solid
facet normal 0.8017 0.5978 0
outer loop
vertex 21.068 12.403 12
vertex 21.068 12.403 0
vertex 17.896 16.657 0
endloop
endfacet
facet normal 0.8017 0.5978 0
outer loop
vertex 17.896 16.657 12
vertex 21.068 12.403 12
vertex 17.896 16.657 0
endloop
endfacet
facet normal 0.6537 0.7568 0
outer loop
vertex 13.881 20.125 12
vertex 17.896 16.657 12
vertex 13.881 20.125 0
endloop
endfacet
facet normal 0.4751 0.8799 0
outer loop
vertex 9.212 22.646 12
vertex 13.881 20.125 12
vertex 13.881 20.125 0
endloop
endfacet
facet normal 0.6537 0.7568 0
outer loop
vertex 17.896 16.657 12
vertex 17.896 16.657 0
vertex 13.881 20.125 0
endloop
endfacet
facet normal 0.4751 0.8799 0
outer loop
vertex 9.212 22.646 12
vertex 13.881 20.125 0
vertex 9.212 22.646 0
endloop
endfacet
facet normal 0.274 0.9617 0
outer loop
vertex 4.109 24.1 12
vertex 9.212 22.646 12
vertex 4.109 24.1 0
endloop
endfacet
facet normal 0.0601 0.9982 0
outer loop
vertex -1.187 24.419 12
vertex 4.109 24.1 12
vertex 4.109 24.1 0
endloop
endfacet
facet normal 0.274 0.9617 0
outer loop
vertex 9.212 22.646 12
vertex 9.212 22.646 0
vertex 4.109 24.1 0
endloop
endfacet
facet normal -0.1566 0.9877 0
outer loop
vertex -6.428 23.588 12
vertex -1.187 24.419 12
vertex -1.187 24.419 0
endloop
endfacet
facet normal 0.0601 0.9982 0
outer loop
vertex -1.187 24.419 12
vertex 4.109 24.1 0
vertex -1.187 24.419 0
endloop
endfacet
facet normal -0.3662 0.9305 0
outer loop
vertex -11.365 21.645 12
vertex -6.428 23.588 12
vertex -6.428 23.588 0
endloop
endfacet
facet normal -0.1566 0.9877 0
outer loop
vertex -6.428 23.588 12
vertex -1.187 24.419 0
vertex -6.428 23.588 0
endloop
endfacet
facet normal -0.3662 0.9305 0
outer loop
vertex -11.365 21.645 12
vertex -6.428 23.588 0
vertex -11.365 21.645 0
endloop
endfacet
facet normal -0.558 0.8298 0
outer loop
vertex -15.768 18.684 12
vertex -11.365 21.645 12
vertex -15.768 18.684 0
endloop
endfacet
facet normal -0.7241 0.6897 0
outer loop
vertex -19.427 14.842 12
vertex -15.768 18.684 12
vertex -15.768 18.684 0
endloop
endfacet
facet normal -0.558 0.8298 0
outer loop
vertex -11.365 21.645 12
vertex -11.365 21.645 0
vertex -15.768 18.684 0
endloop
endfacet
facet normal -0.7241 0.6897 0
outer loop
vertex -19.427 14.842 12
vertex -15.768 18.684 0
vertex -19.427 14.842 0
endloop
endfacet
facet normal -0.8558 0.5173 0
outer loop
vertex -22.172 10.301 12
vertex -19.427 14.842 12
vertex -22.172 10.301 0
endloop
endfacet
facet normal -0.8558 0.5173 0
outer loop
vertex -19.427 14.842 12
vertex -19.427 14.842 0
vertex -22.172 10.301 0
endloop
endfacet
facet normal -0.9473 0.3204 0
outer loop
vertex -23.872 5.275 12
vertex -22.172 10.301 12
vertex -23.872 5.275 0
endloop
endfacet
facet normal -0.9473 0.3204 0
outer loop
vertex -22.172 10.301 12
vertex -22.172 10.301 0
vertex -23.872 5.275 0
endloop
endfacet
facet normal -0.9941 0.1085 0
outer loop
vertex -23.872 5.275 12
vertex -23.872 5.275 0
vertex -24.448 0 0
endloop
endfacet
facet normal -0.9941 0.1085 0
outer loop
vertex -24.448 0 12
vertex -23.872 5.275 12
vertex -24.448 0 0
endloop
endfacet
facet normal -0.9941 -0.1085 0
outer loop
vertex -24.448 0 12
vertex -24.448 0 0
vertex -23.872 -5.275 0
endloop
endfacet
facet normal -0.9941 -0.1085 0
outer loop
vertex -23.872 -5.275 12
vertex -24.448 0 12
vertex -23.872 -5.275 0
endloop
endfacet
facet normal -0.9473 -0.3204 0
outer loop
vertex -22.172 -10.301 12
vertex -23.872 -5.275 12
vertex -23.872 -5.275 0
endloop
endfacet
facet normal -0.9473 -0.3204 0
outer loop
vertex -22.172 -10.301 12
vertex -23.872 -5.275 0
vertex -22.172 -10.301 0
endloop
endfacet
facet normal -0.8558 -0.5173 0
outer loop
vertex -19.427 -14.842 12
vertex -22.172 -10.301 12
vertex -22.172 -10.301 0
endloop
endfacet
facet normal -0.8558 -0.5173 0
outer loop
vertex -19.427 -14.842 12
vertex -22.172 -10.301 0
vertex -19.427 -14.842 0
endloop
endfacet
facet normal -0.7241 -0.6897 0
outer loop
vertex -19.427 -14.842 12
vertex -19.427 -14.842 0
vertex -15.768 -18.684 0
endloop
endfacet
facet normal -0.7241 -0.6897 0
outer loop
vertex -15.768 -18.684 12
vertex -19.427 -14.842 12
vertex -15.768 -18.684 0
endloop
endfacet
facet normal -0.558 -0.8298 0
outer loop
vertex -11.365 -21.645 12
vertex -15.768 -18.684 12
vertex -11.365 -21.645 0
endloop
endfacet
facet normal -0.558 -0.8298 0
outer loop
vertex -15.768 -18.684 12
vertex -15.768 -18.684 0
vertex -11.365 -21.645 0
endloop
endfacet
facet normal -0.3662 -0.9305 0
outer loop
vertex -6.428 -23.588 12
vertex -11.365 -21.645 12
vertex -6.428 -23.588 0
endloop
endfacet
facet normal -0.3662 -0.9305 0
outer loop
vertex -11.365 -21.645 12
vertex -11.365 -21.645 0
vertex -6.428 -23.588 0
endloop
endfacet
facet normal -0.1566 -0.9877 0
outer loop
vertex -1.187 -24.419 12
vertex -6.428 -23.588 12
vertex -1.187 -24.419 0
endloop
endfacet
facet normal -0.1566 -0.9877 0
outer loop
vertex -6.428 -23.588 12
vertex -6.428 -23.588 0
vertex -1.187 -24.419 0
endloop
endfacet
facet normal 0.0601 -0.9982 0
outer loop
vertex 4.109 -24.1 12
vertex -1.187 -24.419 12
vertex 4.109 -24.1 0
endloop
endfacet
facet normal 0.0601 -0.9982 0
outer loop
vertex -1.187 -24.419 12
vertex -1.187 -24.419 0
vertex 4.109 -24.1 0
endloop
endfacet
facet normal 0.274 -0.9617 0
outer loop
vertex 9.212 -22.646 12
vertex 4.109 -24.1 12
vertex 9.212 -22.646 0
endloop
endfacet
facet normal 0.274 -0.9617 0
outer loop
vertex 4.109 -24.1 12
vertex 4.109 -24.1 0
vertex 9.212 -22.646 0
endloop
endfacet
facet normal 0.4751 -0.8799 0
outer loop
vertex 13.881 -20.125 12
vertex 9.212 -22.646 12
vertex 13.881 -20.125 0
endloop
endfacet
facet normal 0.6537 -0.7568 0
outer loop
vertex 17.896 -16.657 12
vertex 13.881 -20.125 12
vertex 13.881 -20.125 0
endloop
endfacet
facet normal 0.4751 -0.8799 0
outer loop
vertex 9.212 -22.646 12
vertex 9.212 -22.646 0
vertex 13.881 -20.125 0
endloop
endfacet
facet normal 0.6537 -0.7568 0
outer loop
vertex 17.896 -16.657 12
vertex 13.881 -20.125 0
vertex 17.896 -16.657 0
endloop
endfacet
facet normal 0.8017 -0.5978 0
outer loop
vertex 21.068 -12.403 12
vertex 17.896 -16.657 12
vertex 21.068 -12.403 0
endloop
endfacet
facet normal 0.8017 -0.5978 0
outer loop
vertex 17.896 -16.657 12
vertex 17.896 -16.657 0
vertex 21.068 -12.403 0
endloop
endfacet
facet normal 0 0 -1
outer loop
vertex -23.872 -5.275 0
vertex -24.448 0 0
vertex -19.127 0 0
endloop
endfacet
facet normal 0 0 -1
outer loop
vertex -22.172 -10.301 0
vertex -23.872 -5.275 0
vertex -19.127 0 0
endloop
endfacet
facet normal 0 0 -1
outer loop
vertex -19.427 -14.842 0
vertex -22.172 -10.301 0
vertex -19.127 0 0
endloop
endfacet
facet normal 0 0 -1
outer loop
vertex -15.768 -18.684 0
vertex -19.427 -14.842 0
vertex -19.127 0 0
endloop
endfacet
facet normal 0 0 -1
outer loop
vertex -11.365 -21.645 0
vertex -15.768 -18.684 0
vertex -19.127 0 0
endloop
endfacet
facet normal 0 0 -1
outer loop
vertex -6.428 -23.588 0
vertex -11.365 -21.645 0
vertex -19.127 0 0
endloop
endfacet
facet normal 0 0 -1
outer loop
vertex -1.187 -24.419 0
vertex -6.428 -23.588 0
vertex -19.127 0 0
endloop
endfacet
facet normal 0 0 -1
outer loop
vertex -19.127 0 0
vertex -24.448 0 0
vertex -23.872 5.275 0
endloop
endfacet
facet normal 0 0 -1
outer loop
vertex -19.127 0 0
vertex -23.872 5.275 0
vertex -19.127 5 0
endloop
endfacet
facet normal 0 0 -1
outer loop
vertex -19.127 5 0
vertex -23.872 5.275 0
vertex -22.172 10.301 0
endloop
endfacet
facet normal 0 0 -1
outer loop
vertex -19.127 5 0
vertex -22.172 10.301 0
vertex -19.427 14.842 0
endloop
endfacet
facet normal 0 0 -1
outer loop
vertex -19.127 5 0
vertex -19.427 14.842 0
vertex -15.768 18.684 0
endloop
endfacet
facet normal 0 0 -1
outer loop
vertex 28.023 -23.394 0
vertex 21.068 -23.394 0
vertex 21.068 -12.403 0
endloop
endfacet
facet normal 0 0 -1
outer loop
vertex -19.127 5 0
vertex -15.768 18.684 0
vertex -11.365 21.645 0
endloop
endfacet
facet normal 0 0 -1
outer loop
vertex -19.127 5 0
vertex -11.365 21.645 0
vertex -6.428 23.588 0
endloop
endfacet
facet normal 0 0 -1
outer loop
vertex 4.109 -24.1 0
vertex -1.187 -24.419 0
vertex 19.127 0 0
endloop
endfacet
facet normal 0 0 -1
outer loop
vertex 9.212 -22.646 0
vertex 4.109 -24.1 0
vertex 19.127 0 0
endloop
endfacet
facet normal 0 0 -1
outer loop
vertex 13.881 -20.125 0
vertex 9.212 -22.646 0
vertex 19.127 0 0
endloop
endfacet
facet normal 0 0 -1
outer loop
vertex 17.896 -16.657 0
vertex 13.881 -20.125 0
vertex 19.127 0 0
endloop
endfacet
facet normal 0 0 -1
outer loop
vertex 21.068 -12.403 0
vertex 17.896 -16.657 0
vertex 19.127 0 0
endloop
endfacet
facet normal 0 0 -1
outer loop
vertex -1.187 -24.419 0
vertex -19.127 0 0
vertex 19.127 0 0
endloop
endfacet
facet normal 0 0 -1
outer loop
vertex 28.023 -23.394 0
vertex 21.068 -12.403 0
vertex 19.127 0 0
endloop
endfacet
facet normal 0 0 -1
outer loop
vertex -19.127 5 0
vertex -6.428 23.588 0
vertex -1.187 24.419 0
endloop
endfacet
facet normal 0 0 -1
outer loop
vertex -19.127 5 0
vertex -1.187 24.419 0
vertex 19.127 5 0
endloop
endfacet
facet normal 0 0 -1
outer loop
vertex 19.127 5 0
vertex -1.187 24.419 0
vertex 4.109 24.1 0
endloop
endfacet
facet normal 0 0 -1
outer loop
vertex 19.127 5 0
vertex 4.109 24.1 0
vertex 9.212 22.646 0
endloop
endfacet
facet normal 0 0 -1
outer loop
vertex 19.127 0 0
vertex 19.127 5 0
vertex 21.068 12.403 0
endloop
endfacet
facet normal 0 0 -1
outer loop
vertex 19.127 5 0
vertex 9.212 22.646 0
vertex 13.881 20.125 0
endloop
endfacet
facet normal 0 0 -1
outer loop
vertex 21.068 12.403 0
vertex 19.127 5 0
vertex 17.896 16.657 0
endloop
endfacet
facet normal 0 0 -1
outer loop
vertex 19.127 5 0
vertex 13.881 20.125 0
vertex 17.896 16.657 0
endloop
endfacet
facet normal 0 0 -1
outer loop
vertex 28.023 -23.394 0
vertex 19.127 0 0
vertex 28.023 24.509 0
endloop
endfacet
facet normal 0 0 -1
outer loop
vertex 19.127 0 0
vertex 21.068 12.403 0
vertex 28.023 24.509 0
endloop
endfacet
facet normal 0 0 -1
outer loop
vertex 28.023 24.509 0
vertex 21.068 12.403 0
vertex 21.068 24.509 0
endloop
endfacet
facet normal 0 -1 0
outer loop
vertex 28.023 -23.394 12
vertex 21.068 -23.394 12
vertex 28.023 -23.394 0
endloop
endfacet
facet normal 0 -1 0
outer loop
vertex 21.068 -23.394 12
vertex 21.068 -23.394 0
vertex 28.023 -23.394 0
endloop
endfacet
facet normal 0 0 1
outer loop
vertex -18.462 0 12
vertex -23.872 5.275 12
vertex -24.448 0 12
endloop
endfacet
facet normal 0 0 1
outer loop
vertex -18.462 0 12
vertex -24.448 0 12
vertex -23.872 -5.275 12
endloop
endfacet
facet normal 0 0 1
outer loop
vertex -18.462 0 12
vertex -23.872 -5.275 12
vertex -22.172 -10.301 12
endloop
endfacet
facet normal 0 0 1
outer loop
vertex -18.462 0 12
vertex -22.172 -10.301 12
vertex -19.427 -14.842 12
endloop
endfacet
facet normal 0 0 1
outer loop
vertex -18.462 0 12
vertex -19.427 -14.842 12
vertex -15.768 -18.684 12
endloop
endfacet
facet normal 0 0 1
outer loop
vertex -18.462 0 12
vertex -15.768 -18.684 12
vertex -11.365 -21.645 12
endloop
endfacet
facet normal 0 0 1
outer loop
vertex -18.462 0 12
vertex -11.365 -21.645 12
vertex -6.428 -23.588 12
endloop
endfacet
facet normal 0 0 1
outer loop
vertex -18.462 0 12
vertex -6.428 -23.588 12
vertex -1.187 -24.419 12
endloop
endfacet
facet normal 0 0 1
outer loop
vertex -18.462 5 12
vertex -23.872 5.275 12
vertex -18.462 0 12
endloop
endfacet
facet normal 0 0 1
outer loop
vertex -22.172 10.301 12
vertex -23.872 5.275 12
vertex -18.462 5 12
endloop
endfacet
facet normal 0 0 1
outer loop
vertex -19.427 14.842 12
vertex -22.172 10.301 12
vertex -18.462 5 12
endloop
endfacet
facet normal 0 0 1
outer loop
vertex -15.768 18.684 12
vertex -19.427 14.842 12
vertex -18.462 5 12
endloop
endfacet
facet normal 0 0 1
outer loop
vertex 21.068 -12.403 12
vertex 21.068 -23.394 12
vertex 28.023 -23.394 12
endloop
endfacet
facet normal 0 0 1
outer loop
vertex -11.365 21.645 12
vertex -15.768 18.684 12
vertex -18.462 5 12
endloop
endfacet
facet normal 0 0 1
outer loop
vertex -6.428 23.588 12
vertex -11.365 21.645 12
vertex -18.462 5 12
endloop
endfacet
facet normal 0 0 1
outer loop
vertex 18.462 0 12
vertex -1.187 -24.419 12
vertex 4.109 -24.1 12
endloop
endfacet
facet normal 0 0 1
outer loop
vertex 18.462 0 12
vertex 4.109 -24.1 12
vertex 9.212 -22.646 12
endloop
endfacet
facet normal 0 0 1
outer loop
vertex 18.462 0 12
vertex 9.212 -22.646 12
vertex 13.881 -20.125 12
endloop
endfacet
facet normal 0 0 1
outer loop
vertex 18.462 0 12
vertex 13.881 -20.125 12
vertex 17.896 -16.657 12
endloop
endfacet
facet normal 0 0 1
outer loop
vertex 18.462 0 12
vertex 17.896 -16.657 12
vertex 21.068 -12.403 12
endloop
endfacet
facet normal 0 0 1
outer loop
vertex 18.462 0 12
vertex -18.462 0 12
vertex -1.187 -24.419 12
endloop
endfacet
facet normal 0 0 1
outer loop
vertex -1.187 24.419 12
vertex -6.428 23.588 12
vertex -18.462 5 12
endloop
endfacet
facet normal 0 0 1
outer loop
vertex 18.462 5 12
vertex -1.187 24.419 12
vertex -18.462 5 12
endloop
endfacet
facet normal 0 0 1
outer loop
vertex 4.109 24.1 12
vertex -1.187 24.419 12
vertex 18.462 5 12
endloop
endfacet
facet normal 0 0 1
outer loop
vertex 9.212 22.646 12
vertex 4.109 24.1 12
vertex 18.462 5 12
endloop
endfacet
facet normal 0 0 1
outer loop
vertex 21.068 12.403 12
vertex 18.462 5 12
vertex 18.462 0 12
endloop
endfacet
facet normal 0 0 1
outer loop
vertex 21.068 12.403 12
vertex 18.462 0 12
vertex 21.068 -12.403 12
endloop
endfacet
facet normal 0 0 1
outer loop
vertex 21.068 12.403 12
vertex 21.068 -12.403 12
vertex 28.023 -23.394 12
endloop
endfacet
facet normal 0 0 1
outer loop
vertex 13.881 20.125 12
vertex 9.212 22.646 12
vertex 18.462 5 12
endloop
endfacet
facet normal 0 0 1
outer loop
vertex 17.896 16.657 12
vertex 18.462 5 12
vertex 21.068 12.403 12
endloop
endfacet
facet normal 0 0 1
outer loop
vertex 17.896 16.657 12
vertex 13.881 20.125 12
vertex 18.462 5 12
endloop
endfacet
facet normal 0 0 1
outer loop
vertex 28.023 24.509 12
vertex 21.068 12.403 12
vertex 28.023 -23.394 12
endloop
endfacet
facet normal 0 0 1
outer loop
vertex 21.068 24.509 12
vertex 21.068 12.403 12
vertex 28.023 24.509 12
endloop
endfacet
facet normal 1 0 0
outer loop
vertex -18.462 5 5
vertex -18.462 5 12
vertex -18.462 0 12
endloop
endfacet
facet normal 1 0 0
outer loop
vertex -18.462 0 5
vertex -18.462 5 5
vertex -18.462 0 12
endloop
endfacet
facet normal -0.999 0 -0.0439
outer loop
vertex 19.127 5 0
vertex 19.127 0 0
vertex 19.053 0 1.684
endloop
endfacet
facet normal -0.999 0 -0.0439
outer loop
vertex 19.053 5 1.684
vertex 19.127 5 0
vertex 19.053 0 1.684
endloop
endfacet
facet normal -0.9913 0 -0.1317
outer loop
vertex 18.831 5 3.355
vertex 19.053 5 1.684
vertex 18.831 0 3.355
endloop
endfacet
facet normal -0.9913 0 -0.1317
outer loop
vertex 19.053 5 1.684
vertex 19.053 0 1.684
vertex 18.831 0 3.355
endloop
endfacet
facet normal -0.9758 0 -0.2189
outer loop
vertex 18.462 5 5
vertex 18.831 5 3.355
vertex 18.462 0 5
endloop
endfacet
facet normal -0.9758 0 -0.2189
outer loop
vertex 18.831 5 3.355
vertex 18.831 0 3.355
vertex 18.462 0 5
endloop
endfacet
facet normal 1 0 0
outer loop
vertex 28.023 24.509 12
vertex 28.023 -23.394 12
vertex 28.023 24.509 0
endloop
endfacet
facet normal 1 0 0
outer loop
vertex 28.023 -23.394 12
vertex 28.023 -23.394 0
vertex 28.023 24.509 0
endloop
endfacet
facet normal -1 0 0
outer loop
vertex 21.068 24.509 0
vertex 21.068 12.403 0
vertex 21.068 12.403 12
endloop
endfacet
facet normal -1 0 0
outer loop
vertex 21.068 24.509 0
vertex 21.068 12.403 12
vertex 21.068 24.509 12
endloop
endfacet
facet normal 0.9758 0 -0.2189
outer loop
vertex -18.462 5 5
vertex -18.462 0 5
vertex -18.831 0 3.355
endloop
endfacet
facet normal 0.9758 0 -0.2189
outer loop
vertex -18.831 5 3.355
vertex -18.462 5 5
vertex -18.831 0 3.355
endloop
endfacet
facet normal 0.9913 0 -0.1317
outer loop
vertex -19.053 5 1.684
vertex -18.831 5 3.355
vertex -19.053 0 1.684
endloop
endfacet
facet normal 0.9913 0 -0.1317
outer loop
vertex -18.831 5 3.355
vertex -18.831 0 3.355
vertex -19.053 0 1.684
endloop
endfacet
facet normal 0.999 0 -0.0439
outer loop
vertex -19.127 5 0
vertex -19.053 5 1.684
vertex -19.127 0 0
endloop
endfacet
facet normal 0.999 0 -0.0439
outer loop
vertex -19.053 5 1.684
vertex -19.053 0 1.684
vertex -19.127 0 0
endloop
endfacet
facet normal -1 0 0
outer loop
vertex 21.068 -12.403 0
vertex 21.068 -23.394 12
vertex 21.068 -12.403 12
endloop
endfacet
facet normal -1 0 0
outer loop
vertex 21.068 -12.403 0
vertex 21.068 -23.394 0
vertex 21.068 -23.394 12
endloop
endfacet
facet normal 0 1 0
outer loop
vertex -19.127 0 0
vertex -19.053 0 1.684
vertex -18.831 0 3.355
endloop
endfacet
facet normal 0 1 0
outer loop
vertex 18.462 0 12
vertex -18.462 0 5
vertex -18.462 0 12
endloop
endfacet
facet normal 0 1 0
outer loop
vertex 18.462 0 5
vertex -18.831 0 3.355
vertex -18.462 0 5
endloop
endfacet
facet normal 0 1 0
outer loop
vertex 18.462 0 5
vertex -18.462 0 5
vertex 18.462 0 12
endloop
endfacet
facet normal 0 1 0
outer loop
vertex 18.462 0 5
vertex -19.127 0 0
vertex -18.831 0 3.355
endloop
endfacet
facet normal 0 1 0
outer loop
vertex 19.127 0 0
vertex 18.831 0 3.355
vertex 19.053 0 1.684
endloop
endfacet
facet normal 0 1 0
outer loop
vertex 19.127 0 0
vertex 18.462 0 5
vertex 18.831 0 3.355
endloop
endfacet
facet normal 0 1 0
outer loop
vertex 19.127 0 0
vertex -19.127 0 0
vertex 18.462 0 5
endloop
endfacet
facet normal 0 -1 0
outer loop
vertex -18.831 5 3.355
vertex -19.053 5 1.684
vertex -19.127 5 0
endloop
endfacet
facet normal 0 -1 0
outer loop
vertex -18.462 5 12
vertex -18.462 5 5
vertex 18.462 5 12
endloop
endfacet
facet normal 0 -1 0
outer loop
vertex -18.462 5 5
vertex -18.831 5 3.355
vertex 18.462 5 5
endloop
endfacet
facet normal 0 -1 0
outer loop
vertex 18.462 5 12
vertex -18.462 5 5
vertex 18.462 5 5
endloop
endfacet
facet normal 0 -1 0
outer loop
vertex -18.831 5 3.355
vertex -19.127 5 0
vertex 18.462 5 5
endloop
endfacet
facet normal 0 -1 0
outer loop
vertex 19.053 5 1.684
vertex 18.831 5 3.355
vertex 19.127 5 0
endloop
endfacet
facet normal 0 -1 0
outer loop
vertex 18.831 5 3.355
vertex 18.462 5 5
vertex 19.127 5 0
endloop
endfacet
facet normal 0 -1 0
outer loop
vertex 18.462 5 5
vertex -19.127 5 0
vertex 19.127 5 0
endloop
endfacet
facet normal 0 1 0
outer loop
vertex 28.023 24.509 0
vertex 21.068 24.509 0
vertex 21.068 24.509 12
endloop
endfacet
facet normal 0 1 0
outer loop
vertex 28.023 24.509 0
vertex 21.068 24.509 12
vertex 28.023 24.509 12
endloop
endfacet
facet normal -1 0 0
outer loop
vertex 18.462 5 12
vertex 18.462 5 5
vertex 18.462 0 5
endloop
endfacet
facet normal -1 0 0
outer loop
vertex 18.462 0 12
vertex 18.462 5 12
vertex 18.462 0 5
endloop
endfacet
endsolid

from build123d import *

# Parameters (mm, degrees)
F0_R     = 24.4478628748
F1_DEPTH = 5
F2_R     = 19.1271532248
F3_DEPTH = 5
F4_W     = 6.9555565715
F4_H     = 47.9025412351
F5_DEPTH = 5
F6_DEPTH = 7


with BuildPart() as f1:
    # F0 (on Top) → F1 (new body)
    with BuildSketch(Plane.XY):
        Circle(F0_R)
    extrude(amount=F1_DEPTH)

    # F2 (on Front) → F3 (cut)
    with BuildSketch(Plane.XZ):
        Circle(F2_R)
    extrude(amount=-F3_DEPTH, mode=Mode.SUBTRACT)

    # F4 (on Top) → F5 (join)
    with BuildSketch(Plane.XY):
        with Locations((24.5456583798, 0.5576470867)):
            Rectangle(F4_W, F4_H)
    extrude(amount=F5_DEPTH)

    # F6 (add): a face of the model
    f6_faces = [f1.faces().sort_by_distance(p)[0] for p in [
        (3.5064630649, -0.1400049466, 5),
    ]]
    extrude(f6_faces, amount=F6_DEPTH)


solid = f1.part
